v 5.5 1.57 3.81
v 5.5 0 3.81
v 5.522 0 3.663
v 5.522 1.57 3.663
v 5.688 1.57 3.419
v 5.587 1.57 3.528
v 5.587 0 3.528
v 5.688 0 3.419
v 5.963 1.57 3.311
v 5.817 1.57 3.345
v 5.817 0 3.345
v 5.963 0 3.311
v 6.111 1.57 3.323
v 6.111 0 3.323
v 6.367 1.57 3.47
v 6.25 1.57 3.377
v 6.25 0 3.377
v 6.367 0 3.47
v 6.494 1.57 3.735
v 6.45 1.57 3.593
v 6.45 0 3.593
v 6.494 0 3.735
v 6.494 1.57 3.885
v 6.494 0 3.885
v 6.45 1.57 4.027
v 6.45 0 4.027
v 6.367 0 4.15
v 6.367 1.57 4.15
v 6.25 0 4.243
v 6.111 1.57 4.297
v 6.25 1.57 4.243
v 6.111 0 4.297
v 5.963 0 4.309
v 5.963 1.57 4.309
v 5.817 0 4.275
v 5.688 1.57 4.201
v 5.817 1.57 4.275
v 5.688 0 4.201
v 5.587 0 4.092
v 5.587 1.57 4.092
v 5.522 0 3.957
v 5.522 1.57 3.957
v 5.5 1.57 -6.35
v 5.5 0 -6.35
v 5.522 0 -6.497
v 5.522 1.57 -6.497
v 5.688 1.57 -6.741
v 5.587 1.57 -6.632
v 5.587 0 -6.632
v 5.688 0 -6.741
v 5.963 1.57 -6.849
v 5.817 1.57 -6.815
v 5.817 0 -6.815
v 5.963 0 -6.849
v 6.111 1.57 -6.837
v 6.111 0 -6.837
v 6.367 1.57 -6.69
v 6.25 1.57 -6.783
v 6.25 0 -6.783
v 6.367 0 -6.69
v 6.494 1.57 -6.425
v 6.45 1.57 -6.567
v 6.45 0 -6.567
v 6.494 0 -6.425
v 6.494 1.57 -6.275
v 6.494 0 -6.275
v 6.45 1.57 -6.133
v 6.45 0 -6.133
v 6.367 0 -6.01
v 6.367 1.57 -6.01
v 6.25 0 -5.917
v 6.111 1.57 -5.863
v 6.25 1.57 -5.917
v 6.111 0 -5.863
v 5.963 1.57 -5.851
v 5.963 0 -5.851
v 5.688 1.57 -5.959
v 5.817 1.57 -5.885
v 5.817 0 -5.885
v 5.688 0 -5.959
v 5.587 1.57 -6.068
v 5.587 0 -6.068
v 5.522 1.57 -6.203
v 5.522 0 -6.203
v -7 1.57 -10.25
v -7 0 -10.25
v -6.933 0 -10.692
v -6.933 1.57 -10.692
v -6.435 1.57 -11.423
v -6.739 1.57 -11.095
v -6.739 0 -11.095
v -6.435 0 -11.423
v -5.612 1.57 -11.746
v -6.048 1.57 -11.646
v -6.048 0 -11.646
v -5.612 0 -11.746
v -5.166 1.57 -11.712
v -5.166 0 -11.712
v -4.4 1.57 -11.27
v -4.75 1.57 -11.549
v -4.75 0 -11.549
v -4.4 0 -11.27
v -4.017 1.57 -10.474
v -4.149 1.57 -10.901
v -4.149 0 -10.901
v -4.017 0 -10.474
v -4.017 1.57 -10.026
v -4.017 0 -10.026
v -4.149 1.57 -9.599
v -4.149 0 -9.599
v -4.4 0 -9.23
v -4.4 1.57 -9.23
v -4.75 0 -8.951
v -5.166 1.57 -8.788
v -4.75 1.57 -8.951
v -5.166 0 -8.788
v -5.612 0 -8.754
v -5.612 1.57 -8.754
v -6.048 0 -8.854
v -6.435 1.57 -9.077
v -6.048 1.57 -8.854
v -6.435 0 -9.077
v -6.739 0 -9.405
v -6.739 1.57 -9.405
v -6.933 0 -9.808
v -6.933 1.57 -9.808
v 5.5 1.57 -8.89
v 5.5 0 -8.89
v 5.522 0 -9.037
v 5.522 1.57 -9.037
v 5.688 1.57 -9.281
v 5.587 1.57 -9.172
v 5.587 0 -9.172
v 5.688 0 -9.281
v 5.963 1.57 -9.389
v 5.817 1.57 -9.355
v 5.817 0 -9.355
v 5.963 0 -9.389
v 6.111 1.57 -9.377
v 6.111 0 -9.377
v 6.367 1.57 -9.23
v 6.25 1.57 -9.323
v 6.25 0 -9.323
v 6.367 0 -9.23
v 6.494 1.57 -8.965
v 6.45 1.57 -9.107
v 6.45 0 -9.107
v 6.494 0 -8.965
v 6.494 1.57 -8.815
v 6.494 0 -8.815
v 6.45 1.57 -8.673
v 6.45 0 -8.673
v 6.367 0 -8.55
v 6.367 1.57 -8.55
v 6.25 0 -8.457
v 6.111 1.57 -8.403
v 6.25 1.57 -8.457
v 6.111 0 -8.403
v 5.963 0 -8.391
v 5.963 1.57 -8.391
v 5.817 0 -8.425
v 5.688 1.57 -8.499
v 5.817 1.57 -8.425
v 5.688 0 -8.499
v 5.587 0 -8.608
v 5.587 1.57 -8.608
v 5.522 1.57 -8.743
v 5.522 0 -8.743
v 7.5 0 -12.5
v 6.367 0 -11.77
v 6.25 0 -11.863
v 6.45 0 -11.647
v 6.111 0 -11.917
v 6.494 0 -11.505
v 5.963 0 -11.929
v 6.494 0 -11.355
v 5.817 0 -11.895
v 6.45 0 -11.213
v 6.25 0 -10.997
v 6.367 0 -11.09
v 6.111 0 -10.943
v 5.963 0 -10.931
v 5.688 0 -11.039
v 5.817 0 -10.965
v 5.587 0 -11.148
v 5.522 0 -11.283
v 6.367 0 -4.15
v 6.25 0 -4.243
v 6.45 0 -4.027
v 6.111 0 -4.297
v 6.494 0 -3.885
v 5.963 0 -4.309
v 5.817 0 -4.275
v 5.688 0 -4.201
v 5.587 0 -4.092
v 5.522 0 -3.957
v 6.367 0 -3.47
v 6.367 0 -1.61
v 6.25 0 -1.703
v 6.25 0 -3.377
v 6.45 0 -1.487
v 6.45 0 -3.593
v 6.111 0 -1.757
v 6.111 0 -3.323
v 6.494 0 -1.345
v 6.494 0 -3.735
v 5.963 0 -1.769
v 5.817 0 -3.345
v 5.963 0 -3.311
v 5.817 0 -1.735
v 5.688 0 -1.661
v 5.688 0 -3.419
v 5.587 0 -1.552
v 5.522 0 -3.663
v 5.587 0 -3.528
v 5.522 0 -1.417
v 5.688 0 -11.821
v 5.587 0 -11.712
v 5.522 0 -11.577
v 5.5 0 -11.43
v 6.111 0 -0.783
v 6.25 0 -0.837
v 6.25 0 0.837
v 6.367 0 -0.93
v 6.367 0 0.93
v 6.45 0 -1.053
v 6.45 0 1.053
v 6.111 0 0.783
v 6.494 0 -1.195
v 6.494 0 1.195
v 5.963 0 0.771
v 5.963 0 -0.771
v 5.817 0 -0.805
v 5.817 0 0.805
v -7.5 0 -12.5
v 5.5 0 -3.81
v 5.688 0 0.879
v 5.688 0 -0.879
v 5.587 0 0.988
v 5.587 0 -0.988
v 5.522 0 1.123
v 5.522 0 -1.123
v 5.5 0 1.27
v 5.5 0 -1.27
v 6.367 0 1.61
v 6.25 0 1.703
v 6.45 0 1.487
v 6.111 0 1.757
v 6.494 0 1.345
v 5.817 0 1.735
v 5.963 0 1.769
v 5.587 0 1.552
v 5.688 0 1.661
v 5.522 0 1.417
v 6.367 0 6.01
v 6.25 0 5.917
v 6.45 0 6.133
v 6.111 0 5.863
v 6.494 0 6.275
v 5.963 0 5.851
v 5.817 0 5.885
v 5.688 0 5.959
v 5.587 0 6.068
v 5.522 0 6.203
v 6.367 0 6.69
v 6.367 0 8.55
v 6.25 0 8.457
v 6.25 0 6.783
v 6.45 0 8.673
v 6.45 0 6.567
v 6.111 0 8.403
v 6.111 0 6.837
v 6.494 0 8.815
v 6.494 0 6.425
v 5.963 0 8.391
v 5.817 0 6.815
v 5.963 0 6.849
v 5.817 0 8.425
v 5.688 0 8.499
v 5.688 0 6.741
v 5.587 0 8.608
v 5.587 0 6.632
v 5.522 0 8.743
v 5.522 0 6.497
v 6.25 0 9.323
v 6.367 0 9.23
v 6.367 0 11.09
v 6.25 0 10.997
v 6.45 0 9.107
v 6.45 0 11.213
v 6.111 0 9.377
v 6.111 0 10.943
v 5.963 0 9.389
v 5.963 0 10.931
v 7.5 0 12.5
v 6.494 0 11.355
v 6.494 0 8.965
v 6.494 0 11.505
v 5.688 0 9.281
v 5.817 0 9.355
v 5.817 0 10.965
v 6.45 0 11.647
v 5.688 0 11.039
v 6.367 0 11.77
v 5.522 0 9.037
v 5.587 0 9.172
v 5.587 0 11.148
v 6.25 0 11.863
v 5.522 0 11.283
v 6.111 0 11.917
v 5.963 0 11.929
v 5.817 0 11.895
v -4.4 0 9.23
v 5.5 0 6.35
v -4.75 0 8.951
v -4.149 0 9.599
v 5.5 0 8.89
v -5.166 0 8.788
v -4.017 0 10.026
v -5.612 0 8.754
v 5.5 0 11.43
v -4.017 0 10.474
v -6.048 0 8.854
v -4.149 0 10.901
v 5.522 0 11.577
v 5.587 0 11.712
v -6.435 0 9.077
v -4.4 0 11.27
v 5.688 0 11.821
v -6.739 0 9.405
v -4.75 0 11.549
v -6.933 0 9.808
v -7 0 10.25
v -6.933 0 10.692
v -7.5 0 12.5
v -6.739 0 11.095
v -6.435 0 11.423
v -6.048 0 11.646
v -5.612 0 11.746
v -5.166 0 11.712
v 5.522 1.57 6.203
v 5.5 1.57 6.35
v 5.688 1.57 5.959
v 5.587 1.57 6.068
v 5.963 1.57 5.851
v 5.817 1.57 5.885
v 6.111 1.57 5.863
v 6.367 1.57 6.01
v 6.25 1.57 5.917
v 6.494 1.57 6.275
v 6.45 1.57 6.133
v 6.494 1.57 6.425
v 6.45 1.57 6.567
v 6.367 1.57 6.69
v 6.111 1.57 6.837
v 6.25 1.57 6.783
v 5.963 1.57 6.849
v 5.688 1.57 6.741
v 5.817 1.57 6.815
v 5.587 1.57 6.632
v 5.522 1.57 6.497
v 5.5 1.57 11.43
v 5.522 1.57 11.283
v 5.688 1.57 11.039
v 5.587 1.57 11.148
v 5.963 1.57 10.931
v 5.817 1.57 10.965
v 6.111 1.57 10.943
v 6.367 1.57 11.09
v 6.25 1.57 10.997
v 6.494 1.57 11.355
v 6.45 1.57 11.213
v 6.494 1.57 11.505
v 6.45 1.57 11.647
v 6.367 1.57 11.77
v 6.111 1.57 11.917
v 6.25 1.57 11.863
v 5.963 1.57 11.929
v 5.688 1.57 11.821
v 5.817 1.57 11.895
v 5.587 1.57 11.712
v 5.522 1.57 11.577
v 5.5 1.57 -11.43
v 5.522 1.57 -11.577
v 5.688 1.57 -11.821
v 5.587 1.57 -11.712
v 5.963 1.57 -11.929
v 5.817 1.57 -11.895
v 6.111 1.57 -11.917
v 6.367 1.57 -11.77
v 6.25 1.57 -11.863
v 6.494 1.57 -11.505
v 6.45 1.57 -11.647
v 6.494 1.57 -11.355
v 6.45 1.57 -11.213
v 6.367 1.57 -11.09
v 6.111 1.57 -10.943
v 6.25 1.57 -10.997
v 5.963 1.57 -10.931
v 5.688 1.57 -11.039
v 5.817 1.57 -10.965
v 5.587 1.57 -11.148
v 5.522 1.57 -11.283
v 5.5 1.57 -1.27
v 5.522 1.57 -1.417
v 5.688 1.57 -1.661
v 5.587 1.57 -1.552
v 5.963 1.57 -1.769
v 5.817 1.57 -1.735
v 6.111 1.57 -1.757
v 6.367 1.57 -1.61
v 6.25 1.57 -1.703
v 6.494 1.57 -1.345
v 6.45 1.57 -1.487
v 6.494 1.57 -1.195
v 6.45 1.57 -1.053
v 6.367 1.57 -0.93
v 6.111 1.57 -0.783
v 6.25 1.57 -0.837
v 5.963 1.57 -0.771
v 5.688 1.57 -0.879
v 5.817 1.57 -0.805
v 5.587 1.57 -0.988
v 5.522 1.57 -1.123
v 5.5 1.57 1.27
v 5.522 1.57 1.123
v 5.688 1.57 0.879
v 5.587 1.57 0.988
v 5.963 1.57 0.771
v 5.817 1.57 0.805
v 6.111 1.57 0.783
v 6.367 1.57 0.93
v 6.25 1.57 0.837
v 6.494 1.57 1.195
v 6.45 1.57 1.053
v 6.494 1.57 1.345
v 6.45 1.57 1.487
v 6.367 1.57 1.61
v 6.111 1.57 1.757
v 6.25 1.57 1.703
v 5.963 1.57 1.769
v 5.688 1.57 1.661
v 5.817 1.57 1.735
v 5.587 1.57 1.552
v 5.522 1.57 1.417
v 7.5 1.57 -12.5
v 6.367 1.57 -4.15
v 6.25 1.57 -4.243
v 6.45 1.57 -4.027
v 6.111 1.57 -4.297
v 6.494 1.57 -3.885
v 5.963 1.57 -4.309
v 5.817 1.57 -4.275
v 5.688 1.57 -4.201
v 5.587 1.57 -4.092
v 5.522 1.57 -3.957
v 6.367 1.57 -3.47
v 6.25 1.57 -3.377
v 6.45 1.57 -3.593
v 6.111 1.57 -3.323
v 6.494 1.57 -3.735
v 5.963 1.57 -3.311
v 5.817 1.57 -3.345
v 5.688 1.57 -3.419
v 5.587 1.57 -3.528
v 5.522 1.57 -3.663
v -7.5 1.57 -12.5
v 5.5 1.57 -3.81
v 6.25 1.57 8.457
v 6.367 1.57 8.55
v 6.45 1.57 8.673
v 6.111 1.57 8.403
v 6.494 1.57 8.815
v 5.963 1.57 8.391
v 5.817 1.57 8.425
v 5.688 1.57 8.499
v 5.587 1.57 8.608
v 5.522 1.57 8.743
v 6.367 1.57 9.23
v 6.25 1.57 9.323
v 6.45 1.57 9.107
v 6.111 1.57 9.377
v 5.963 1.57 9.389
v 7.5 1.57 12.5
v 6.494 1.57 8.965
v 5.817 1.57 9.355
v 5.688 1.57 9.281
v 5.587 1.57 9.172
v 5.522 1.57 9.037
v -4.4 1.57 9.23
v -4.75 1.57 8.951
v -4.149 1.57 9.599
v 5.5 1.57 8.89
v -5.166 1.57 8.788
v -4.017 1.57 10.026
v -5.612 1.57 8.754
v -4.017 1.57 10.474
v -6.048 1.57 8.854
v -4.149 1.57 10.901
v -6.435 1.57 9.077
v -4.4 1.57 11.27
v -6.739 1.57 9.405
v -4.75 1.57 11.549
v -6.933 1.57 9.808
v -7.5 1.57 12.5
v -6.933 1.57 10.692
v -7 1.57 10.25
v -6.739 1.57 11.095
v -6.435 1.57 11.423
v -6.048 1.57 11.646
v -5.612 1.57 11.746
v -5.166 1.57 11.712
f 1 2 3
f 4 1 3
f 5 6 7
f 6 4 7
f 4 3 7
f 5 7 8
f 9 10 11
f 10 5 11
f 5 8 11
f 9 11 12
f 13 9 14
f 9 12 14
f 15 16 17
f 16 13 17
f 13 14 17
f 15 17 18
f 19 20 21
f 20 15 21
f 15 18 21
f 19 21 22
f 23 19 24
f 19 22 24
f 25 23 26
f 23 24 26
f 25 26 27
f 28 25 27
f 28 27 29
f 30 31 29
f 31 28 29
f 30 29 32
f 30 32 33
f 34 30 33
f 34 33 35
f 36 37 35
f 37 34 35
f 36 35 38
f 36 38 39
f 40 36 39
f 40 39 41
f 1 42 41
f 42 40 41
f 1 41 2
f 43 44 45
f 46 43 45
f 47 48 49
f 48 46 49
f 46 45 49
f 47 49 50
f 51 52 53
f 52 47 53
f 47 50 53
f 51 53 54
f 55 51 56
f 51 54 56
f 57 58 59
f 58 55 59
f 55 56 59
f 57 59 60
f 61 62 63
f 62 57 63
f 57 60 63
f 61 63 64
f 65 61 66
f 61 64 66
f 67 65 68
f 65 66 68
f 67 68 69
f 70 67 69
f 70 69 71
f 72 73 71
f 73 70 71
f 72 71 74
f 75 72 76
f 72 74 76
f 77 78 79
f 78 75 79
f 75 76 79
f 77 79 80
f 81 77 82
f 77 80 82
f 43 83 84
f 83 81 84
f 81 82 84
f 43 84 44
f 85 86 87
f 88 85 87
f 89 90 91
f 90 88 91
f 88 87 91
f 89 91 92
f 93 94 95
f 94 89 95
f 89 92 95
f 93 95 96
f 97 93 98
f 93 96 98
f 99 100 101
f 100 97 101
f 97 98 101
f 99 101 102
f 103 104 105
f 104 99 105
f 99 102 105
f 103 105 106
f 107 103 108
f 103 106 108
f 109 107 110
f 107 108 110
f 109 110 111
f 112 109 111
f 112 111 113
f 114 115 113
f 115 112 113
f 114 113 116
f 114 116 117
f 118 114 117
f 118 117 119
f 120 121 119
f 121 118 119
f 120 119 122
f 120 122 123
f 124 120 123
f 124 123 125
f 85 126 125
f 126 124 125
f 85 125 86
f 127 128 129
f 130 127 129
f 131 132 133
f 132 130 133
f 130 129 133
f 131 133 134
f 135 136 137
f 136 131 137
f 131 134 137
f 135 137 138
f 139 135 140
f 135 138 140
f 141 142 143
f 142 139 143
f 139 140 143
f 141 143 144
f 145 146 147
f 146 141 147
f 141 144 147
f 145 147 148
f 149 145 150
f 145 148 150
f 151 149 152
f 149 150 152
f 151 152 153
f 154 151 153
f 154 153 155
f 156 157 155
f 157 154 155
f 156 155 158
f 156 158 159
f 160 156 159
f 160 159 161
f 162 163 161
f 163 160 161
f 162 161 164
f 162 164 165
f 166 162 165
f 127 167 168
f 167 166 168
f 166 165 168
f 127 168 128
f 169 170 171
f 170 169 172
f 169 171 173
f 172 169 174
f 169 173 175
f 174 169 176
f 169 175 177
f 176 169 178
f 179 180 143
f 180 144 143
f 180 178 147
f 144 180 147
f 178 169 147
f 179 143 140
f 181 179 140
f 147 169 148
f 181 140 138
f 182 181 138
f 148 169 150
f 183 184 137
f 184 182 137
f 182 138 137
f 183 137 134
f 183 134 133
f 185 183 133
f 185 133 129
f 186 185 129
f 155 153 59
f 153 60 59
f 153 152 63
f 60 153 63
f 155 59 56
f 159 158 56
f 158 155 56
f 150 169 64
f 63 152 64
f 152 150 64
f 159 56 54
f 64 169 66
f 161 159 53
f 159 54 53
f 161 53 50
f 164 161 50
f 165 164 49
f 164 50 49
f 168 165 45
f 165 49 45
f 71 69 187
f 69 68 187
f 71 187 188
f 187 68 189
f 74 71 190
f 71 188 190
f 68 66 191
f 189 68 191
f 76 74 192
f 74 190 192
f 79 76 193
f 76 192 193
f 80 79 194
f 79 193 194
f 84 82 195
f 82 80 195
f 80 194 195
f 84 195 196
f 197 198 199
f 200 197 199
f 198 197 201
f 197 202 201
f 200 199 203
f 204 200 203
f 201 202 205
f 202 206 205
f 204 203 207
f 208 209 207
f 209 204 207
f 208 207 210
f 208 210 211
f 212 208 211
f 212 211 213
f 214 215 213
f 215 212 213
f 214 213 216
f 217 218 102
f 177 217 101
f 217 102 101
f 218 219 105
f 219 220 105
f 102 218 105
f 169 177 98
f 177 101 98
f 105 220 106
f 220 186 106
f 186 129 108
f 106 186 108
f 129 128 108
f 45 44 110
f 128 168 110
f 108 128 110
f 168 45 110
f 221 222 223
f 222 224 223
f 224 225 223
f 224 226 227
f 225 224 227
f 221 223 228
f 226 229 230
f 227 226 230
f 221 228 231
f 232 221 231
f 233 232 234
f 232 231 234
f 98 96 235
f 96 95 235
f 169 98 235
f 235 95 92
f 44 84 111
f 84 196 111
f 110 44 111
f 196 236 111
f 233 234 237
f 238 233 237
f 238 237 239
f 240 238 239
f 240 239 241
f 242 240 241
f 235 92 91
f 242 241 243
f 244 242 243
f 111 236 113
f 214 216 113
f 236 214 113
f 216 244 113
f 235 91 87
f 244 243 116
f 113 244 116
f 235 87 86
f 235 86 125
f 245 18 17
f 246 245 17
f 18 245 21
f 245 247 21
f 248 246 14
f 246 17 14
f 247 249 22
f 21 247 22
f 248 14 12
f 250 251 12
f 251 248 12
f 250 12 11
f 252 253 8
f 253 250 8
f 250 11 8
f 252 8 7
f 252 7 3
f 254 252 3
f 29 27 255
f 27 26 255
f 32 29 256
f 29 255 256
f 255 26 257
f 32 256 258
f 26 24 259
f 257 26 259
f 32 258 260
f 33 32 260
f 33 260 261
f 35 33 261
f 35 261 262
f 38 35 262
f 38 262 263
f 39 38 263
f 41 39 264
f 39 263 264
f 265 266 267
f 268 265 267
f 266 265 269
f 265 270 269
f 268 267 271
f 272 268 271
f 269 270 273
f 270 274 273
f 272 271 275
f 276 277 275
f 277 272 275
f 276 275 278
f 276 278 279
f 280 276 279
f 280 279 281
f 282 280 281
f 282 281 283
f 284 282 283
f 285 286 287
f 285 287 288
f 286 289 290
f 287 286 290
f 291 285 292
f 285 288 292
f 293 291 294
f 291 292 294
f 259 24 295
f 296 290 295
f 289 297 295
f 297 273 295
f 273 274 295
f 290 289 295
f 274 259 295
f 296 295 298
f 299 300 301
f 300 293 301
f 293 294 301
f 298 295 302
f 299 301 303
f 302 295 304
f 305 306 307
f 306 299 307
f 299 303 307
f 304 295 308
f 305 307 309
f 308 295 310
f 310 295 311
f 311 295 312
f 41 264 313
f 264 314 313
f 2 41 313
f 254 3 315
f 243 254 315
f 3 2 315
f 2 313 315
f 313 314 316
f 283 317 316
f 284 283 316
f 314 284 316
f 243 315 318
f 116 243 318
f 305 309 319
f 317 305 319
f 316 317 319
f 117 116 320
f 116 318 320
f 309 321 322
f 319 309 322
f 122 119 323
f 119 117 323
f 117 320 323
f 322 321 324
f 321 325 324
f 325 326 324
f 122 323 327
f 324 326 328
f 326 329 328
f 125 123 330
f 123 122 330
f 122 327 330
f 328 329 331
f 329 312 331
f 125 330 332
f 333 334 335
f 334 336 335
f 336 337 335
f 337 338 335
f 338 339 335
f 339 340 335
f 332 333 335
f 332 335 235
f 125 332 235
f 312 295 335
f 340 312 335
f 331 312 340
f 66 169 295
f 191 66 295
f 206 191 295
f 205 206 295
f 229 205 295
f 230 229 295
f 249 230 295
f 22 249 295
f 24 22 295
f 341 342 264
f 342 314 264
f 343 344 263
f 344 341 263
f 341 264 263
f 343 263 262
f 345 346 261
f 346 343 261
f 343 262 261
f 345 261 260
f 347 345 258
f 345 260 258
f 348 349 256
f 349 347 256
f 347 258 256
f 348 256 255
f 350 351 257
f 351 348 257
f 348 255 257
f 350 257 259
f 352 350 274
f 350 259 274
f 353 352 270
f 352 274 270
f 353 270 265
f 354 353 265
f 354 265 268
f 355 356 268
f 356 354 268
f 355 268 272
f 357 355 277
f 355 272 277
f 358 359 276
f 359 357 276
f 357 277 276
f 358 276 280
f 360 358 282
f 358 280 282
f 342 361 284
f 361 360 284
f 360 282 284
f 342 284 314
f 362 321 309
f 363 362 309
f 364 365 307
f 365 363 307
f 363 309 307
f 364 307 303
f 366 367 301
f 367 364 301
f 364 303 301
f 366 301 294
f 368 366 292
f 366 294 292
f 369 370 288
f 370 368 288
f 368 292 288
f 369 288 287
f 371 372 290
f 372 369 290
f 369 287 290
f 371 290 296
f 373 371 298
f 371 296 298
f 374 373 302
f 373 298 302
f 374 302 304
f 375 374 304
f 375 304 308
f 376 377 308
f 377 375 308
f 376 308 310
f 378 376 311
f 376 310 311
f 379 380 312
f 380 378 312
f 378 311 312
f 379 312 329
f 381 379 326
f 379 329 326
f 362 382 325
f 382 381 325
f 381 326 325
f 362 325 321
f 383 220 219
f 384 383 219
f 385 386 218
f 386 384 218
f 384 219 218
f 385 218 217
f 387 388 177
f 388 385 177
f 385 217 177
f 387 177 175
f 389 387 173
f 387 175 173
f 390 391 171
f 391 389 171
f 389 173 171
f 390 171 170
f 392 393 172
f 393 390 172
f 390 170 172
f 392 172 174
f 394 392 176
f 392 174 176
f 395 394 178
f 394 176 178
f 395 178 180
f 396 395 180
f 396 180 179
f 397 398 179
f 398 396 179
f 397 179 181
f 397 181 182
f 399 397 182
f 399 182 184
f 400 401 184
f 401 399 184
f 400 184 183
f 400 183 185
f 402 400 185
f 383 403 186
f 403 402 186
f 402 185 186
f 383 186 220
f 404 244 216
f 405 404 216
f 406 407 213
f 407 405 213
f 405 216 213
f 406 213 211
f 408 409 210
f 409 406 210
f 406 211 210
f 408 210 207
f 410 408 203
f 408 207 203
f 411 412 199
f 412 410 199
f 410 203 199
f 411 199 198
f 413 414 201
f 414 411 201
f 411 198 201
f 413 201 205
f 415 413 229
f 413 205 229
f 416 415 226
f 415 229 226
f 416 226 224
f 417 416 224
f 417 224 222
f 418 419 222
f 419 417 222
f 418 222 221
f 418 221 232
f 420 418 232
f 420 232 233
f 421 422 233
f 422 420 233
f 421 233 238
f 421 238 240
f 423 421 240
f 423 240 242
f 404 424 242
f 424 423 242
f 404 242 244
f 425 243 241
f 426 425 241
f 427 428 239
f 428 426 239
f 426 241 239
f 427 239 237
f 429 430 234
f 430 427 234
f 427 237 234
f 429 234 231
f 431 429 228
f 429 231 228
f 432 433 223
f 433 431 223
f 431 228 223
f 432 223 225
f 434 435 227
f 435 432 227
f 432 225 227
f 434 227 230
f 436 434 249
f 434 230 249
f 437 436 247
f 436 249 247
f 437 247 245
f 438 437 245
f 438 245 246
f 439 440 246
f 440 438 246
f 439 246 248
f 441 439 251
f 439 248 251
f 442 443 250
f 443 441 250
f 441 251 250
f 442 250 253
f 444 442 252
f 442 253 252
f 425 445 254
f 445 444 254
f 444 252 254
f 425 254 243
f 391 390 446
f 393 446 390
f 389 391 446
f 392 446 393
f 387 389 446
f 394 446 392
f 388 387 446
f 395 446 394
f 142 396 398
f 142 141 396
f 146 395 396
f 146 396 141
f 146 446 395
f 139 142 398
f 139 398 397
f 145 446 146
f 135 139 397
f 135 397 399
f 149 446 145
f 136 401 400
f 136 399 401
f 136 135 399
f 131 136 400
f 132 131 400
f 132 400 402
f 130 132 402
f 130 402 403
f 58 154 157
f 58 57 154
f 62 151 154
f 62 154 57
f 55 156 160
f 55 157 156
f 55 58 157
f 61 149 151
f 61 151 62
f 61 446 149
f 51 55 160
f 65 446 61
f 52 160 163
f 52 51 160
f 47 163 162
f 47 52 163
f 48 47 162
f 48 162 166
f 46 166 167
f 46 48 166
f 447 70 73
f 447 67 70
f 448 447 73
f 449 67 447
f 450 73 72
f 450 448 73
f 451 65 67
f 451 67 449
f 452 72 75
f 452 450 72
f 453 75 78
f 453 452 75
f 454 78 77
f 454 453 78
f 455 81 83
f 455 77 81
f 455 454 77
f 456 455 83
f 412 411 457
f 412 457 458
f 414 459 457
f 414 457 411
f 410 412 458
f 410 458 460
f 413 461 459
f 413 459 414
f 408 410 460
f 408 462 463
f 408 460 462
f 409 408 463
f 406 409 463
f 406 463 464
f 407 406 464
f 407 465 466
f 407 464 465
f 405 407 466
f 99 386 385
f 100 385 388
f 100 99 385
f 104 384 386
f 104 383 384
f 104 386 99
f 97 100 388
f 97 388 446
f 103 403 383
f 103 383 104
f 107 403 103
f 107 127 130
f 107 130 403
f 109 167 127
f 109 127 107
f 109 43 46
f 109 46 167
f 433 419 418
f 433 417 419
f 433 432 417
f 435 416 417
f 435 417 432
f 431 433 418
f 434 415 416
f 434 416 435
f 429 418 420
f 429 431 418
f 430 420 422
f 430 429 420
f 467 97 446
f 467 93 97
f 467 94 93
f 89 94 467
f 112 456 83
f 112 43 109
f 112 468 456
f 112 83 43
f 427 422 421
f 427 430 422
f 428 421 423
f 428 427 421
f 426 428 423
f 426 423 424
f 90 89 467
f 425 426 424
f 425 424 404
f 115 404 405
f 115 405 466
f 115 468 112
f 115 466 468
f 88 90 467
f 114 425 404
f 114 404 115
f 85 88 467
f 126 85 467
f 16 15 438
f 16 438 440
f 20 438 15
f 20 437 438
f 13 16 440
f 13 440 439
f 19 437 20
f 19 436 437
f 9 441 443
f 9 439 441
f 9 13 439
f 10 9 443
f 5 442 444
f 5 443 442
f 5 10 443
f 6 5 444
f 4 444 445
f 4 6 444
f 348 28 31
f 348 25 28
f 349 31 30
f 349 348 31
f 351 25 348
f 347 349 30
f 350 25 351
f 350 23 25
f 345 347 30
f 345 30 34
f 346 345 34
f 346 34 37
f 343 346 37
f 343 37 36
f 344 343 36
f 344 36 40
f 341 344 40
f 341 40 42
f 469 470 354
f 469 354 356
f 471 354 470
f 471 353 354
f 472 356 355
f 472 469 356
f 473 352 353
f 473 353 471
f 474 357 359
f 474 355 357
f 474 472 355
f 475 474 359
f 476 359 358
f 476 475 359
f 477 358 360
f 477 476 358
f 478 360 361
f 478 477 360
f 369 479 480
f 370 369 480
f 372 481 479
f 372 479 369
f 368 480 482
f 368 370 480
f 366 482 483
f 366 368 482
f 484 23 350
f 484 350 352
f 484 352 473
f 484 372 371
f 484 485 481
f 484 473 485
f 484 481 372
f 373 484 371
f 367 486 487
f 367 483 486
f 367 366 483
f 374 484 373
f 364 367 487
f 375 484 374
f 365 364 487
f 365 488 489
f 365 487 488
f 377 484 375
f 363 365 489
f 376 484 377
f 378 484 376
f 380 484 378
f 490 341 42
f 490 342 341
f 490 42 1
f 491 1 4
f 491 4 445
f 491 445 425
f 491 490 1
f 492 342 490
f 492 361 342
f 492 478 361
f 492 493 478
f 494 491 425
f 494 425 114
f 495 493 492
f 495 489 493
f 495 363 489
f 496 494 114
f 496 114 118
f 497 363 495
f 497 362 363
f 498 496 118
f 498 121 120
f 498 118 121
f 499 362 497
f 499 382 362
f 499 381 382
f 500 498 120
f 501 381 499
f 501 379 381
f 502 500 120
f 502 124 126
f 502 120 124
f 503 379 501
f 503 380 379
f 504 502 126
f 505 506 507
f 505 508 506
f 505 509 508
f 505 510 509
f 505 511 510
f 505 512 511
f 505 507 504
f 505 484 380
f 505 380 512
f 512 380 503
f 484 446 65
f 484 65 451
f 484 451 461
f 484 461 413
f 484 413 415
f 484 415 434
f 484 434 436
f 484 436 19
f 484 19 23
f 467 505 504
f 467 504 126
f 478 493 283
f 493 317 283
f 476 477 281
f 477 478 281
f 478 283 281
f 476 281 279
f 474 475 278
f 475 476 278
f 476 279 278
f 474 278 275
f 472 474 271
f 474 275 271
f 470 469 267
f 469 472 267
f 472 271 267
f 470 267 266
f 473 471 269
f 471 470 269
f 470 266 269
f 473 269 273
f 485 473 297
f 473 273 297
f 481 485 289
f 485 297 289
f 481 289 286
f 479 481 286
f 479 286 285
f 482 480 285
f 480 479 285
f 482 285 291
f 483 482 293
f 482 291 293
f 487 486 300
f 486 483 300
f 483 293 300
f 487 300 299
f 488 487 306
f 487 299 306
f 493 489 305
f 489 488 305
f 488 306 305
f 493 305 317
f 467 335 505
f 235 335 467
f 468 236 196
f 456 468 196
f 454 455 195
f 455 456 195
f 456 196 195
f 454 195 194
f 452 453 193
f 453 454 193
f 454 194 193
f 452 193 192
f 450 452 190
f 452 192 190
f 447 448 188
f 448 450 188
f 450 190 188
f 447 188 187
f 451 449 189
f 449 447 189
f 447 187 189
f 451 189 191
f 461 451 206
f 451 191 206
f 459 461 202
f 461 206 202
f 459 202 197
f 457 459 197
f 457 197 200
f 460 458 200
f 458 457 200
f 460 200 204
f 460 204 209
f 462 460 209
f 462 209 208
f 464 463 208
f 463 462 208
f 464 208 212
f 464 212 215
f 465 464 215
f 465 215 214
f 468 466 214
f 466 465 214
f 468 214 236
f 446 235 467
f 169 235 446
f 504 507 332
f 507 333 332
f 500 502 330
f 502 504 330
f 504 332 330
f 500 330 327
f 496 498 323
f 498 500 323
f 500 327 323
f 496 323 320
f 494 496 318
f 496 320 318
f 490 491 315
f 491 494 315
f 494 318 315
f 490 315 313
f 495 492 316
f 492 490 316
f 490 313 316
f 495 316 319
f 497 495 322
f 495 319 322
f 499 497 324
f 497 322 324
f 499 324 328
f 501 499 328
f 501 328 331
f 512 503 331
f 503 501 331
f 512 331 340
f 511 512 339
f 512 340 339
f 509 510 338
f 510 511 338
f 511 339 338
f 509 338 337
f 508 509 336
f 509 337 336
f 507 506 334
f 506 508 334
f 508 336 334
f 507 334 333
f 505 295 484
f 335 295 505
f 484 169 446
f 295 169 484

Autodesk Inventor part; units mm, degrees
ref_plane "YZ Plane" through (0, 0, 0) normal (1, 0, 0) x (0, 1, 0)
ref_plane "XZ Plane" through (0, 0, 0) normal (0, 1, 0) x (-1, 0, 0)
ref_plane "XY Plane" through (0, 0, 0) normal (0, 0, 1) x (1, 0, 0)
sketch "Sketch1" plane through (0, 0, 0) normal (0, 1, 0) x (-1, 0, 0)
  line L0 (7.5, -12.5) -> (-7.5, -12.5)
  line L1 (-7.5, -12.5) -> (-7.5, 12.5)
  line L2 (-7.5, 12.5) -> (7.5, 12.5)
  line L3 (7.5, 12.5) -> (7.5, -12.5)
  line L4 (7.5, -12.5) -> (-7.5, 12.5) construction
  line L5 (-7.5, -12.5) -> (7.5, 12.5) construction
  circle A0 centre (5.5, 10.25) radius 1.5
  circle A1 centre (5.5, -10.25) radius 1.5
  line L6 (-6, 12.5) -> (-6, -12.5) construction
  circle A2 centre (-6, 11.43) radius 0.5
  circle A3 centre (-6, 8.89) radius 0.5
  circle A4 centre (-6, 6.35) radius 0.5
  circle A5 centre (-6, 3.81) radius 0.5
  circle A6 centre (-6, 1.27) radius 0.5
  circle A7 centre (-6, -1.27) radius 0.5
  circle A8 centre (-6, -3.81) radius 0.5
  circle A9 centre (-6, -6.35) radius 0.5
  circle A10 centre (-6, -8.89) radius 0.5
  circle A11 centre (-6, -11.43) radius 0.5
  point P0 (0, 0)
  dimension "d0" = 15
  dimension "d1" = 25
  dimension "d2" = 3
  dimension "d3" = 2.25
  dimension "d4" = 3
  dimension "d5" = 20.5
  dimension "d6" = 2.25
  dimension "d7" = 2
  dimension "d8" = 2
  dimension "d11" = 1.5
  dimension "d12" = 1
  dimension "d13" = 1.07
  dimension "d16" = 2.54
  dimension "d21" = 1.07
extrude "Extrusion2" add sketch "Sketch1" along normal blind 1.57
properties part number "board"
